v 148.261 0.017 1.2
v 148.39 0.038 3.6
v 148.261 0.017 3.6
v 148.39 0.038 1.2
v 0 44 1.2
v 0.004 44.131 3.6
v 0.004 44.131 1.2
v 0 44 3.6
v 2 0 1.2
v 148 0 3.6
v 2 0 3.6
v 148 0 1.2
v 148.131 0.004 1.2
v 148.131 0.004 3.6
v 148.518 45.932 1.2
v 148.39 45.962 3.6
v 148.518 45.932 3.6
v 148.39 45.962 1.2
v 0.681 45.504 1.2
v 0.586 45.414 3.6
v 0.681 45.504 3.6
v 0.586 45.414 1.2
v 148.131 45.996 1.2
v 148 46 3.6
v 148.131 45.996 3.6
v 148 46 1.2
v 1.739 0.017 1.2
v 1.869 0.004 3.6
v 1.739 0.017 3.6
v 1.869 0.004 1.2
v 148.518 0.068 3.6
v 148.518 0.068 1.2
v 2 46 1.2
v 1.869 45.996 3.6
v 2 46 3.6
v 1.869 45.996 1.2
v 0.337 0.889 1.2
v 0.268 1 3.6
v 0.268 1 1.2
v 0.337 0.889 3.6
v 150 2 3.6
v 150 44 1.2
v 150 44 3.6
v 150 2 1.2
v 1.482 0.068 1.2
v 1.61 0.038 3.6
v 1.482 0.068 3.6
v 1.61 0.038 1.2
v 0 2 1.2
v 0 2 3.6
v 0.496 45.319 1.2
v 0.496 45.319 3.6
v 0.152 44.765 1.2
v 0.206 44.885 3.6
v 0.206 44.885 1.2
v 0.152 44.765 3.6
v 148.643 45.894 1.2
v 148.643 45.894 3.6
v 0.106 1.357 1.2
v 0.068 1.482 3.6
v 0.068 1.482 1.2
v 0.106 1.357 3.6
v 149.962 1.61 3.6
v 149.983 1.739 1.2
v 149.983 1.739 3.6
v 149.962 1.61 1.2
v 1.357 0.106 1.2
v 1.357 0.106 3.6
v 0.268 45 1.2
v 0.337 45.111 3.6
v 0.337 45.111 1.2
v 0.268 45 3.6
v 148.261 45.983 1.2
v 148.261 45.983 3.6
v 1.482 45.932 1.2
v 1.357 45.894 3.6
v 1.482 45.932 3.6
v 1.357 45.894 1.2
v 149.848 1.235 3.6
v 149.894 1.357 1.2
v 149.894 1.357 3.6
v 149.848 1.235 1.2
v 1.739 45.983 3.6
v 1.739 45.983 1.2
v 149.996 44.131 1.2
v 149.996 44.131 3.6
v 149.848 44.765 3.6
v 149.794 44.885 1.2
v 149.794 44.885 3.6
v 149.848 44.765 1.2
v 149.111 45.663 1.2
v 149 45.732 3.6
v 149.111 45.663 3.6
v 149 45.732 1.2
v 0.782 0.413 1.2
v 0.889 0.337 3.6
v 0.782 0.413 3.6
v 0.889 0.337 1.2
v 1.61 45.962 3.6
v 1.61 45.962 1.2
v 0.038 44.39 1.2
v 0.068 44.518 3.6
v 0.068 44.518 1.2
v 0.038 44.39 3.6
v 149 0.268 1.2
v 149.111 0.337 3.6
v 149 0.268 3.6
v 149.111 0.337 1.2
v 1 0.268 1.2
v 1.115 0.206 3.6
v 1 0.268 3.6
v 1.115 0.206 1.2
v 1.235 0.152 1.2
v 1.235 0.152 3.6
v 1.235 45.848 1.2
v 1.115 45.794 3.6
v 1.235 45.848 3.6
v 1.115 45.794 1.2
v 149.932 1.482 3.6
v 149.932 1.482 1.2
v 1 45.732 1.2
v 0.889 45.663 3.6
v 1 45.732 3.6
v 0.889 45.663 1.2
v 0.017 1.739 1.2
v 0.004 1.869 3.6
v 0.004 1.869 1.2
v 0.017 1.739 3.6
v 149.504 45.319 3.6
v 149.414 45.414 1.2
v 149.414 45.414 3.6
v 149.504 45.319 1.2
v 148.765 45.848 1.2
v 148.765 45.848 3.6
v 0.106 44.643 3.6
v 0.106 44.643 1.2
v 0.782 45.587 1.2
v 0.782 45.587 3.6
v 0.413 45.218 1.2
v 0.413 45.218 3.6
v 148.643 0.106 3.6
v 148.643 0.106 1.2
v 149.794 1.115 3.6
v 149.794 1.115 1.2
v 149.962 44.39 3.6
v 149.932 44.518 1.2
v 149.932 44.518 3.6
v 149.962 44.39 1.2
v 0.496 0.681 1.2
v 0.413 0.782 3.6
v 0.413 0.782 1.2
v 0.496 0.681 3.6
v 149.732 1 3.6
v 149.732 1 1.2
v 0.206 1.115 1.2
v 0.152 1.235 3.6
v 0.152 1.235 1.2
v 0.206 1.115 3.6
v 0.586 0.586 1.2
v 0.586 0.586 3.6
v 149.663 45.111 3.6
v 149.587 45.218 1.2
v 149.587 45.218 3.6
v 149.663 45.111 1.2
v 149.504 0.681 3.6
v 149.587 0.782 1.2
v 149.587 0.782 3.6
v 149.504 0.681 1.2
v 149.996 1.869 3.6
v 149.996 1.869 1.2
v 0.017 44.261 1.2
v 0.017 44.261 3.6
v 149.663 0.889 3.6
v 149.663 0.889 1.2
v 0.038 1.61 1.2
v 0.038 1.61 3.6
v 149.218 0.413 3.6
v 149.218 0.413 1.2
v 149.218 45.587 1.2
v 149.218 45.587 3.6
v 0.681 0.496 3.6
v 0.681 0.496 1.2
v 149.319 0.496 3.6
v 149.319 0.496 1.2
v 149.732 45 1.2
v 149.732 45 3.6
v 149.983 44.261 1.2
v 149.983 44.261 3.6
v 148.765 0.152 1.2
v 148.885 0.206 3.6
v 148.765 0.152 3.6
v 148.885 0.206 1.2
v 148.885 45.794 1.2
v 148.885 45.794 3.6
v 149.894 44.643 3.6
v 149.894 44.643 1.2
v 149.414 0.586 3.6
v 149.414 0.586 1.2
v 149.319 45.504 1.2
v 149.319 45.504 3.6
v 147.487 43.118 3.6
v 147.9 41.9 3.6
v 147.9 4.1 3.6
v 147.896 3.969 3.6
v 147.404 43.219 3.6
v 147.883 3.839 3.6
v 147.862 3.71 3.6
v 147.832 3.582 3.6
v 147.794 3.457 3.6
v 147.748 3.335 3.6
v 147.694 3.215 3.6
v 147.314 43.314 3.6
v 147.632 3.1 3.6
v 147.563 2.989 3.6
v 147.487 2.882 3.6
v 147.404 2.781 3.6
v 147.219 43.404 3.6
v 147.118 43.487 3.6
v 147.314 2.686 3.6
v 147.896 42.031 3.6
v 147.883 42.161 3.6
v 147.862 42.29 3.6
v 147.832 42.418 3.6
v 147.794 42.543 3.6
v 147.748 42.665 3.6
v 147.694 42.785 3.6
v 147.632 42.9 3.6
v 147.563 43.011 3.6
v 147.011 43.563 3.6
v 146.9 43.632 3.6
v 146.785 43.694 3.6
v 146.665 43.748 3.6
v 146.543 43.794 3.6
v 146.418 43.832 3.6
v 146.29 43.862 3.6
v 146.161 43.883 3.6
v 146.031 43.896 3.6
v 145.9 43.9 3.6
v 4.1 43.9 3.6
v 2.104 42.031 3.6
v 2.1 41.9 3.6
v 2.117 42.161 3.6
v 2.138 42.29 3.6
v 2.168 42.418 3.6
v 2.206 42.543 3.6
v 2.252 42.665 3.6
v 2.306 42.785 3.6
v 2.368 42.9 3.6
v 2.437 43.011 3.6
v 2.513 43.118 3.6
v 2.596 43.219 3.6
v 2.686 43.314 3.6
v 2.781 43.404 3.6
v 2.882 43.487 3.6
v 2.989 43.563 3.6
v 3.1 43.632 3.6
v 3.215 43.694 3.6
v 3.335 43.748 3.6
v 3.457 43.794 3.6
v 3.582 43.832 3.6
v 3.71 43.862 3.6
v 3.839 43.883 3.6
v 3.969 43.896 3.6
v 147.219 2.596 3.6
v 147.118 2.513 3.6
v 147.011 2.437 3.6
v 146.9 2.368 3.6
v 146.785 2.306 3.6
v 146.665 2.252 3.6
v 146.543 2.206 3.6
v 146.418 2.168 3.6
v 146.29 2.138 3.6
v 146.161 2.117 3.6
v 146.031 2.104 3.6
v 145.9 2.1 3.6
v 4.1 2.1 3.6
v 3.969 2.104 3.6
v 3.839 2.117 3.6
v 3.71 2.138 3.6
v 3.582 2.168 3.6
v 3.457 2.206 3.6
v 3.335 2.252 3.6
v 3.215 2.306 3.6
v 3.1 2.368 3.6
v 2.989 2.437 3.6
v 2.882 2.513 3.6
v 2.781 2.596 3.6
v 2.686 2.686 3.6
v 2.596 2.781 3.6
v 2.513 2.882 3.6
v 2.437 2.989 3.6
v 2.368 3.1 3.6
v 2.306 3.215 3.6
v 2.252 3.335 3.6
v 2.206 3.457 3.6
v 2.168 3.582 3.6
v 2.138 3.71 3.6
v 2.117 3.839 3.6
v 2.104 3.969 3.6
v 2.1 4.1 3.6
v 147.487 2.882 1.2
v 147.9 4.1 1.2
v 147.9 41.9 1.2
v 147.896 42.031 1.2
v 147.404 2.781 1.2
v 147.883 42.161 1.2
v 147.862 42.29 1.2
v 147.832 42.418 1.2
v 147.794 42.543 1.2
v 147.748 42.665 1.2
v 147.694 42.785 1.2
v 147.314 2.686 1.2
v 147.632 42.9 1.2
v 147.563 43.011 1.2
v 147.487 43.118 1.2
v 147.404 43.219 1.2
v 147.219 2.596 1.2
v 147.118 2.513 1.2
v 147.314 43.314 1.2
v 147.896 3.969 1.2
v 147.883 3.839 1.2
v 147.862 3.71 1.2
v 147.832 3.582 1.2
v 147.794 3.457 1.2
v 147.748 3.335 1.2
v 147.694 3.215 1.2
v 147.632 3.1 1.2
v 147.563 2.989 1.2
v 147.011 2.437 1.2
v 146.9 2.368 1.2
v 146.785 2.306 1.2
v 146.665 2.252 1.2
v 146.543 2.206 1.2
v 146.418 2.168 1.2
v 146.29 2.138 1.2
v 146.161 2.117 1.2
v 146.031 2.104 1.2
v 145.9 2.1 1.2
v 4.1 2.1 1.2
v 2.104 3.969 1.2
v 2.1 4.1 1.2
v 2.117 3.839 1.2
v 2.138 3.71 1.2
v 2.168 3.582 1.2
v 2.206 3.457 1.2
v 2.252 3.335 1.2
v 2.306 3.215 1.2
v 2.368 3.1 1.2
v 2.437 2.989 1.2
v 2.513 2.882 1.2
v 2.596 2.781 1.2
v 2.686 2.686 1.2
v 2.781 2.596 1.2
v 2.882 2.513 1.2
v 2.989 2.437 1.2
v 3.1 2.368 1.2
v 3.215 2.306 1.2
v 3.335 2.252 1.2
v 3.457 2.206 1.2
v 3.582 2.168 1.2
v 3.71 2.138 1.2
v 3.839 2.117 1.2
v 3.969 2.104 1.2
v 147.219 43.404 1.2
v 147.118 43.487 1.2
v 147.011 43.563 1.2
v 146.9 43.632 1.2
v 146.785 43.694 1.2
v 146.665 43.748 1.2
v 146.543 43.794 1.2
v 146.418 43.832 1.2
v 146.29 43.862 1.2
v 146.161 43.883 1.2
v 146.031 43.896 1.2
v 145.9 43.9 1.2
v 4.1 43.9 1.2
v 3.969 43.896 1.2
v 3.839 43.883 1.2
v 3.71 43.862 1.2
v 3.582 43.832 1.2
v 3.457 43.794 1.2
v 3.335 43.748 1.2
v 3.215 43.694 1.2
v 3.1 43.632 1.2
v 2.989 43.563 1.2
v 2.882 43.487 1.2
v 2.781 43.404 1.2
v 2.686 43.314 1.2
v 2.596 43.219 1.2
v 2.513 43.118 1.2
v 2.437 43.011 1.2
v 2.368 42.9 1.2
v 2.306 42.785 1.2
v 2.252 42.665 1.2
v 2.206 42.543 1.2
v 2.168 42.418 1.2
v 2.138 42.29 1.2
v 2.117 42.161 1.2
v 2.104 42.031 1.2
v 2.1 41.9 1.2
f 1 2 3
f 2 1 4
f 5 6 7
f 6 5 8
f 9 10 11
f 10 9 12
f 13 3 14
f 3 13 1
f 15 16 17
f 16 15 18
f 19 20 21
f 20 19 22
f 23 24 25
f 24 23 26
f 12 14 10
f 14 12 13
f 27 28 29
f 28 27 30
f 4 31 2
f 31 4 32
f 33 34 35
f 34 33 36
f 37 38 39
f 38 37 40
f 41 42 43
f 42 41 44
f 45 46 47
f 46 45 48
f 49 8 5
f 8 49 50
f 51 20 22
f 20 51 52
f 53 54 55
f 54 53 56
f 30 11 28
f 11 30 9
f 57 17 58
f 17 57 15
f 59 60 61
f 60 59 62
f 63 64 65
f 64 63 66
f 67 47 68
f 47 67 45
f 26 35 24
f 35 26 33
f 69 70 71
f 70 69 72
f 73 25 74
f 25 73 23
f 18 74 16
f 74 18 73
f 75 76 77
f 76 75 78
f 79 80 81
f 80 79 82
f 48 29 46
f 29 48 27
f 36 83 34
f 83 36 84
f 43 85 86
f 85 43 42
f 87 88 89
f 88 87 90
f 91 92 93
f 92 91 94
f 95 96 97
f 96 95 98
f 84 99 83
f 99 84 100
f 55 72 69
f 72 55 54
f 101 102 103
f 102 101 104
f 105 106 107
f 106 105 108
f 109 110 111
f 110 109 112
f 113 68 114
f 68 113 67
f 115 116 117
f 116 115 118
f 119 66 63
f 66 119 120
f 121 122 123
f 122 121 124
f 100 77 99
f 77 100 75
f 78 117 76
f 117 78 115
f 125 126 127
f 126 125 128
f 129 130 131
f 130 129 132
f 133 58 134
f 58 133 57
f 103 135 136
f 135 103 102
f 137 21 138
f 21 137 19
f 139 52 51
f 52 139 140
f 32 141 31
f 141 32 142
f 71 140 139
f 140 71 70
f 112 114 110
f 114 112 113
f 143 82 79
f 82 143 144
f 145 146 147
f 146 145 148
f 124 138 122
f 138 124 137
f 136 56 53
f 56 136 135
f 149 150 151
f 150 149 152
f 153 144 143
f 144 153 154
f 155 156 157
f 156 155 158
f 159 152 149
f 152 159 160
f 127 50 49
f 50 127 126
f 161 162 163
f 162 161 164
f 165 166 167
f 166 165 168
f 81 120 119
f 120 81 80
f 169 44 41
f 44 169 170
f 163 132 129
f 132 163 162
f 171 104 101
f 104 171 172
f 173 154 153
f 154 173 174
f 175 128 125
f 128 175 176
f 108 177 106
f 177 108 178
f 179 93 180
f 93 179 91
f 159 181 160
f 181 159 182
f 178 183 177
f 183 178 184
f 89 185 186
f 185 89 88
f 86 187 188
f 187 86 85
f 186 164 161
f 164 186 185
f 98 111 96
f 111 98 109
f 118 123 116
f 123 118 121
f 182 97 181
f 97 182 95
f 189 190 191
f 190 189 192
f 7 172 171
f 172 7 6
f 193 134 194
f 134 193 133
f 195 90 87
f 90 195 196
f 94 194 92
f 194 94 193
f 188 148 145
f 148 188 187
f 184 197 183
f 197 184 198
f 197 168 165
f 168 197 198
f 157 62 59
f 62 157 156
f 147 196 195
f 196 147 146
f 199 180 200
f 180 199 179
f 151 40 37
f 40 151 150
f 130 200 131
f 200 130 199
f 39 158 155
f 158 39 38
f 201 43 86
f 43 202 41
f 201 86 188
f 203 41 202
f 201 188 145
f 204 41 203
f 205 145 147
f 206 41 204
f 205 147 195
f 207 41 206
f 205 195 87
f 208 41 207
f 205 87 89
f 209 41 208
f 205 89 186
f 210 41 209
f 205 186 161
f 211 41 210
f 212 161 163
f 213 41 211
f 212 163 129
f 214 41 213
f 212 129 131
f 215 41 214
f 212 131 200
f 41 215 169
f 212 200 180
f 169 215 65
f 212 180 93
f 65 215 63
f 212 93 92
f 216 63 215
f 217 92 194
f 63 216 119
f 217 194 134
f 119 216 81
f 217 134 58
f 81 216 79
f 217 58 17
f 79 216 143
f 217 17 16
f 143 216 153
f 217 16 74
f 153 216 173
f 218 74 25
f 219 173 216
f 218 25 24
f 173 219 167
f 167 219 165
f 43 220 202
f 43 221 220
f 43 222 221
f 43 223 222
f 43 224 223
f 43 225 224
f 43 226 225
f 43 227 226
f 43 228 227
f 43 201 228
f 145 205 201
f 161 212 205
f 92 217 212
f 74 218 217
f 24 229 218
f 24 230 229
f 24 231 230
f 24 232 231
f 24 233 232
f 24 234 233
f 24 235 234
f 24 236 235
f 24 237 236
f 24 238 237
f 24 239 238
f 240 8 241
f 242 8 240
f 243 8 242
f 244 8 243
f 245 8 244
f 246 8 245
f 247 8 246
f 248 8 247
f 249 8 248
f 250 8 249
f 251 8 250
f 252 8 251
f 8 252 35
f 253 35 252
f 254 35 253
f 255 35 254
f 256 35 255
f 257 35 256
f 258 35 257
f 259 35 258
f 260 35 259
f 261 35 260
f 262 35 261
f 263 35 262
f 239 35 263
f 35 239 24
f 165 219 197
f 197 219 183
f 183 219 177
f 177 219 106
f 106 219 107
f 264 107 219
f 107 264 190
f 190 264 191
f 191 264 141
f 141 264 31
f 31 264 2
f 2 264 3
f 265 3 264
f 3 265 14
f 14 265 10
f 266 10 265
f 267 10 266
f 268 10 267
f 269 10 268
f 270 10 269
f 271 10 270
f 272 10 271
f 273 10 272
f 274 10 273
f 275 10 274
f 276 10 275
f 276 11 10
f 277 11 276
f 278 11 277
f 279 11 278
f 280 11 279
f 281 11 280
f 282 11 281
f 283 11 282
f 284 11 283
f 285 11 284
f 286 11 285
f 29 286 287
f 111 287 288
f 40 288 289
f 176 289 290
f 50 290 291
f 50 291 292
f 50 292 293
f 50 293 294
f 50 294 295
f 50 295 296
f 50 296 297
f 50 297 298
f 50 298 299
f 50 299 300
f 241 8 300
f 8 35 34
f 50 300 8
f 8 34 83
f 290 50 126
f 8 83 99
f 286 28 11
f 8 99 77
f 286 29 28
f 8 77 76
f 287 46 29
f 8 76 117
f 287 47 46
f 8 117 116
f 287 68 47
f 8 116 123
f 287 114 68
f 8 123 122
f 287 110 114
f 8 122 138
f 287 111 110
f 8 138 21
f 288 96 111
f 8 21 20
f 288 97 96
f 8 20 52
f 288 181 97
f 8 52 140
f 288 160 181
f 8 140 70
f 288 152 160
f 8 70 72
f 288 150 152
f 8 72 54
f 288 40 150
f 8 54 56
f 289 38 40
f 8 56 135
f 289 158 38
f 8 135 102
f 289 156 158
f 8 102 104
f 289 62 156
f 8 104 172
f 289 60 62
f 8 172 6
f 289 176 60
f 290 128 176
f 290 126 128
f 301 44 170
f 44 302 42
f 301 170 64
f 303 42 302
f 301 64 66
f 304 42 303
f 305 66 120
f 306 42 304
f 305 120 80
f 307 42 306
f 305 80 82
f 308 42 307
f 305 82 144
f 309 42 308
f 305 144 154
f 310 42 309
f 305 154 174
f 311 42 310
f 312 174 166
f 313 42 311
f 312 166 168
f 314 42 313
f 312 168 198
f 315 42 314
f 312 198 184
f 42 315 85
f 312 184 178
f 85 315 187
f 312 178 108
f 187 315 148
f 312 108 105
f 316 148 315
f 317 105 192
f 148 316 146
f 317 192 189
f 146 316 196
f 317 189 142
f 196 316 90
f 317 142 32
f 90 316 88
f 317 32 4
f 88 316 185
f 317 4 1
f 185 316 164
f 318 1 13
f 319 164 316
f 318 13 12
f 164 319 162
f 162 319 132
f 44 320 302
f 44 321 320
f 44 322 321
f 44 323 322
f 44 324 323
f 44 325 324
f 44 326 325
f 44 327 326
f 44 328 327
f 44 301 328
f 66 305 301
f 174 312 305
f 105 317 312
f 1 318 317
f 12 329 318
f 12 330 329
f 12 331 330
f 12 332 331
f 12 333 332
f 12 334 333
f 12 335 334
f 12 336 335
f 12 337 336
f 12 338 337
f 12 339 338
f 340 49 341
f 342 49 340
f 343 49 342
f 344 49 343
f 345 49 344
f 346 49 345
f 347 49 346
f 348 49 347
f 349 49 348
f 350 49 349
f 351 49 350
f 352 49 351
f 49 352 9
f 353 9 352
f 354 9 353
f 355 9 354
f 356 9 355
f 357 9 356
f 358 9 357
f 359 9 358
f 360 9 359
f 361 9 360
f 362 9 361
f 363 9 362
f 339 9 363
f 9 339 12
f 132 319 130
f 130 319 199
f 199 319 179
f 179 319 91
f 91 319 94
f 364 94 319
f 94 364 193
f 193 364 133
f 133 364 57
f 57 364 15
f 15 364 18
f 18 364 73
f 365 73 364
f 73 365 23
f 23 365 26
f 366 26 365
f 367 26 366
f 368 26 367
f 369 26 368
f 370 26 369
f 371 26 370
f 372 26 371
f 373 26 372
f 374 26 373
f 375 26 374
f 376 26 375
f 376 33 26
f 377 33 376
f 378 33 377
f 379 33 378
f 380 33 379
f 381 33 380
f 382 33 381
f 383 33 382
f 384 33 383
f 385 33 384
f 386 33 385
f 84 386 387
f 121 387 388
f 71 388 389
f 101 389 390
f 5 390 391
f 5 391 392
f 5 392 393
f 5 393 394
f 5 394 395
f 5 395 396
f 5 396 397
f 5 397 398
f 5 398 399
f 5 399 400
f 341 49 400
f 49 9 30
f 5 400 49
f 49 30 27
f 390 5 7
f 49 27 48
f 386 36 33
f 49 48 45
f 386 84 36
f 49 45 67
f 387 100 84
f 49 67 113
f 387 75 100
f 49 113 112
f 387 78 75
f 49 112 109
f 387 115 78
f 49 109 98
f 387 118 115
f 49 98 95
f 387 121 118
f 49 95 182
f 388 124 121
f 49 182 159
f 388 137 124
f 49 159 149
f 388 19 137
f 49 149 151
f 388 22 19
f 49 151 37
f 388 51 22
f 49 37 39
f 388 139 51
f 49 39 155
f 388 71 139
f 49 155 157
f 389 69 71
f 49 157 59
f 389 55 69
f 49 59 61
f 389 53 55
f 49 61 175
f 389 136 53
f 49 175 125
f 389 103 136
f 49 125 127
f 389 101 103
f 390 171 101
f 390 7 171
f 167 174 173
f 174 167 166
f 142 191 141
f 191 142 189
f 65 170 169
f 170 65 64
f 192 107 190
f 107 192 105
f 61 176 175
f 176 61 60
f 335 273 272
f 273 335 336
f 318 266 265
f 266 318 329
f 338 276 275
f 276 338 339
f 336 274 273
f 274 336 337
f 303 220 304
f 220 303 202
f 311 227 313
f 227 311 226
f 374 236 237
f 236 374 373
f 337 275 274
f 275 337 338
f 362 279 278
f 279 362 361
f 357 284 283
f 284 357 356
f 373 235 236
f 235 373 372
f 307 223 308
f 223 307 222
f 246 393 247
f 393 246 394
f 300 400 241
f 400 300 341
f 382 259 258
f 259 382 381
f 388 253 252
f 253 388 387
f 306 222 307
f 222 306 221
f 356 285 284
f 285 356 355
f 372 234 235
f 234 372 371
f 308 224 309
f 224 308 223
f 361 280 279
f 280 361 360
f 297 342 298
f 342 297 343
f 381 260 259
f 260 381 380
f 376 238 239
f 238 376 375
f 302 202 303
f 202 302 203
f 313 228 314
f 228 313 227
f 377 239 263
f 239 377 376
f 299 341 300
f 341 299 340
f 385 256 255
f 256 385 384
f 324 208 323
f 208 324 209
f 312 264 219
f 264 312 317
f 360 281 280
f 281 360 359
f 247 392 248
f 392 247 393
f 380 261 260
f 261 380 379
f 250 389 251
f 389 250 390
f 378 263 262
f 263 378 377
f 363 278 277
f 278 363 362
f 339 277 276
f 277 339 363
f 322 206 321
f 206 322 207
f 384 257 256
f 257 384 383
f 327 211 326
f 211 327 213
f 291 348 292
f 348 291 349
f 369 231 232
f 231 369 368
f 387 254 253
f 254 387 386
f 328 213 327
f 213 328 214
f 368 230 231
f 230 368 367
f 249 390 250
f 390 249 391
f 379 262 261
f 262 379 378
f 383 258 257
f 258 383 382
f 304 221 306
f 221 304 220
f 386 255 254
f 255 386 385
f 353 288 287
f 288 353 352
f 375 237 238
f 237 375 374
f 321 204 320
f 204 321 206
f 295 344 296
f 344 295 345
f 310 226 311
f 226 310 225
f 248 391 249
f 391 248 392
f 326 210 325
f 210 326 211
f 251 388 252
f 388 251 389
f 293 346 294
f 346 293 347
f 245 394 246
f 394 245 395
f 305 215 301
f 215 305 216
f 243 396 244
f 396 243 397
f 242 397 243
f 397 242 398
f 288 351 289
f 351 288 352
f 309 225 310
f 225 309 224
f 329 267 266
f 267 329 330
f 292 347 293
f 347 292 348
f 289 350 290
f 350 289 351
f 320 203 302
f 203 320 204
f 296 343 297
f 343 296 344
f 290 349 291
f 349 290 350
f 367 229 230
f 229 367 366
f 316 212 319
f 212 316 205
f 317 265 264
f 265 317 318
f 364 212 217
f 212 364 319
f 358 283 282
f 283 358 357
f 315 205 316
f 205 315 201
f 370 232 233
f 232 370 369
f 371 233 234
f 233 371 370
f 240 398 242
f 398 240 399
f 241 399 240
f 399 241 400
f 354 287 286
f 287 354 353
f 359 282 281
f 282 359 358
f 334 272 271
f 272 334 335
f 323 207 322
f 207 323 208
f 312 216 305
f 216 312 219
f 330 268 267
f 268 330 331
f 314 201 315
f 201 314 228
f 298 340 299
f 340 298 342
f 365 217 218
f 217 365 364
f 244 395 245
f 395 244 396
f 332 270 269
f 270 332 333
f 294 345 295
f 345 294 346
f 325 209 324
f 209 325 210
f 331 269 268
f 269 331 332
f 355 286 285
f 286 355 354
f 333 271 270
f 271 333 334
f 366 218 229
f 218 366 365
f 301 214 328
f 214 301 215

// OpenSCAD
/*
 * Wall Clock Case for LED Matrix Display
 *
 * A 3D printable case designed for a 4x MAX7219 LED matrix display
 * with integrated GPS module mounting and ventilation system.
 *
 * Features:
 * - Customizable dimensions for different LED matrix sizes
 * - Integrated ventilation system for heat dissipation (optional cross-flow)
 * - GPS module mounting (Neo-6M compatible)
 * - M3 screw mounting system
 * - Rounded corners
 * - Modular design for easy customization
 *
 * Author: zeevy
 * License: MIT
 * Version: 1.1
 *
 * Dependencies:
 * - OpenSCAD 2019.05 or later
 *
 * Usage:
 * - Toggle the render flags in the Assembly section to choose what to export.
 * - Adjust parameters in the Configuration section as needed.
 * - Use $preview = true for fast preview, false for final render.
 */

// ============================================================================
// CONFIGURATION PARAMETERS
// ============================================================================

// Rendering quality
$fn = $preview ? 30 : 96;

// Render epsilon. Keeps boolean cuts from leaving zero-thickness faces.
// Tuned separately from physical assembly clearance (see back_panel_fit_tolerance).
eps = 0.05;

// Material and manufacturing parameters
wall_thickness        = 3.5;    // Thickness of case walls
screen_thickness      = 0.64;   // Thickness of screen/display area

// LED Matrix Display dimensions (MAX7219 4x configuration)
led_matrix_length     = 128 + 1;  // Length of LED matrix + clearance
led_matrix_width      = 32 + 1;   // Width of LED matrix + clearance
led_matrix_height     = 15;       // Height of LED matrix

// Main case dimensions
case_length           = 150;    // Total length of the case
case_width            = 46;     // Total width of the case
case_height           = 32;     // Total height of the case
case_bottom_thickness = 5;      // Thickness of bottom panel that holds the LED matrix
case_corner_radius    = 2;      // Corner radius for case and panel geometry

// Back panel fit. Total radial clearance between panel and its recess in the case.
back_panel_fit_tolerance = 0.3;

// Ventilation
ventilation_hole_diameter   = 1.26;
ventilation_slot_length     = 16;
ventilation_hole_spacing    = 3.8;
ventilation_hole_count      = 8;
ventilation_enable_back_wall = true;  // Mirror vents to opposite long wall for cross-flow

// GPS antenna (Neo-6M is square ~25mm)
gps_antenna_size            = 25.25;
gps_module_cutout_inset_x   = 40;   // Distance from case end (back panel antenna cutout)
gps_module_bracket_inset_x  = 42;   // Distance from case end (back panel bracket)
gps_post_origin_x           = 96;   // X offset for Neo-6M PCB mounting posts (back panel frame)
gps_post_spacing_x          = 31;   // PCB hole spacing in X (Neo-6M board)
gps_post_spacing_y          = 20.6; // PCB hole spacing in Y (Neo-6M board)

// Hardware
m3_screw_tap_hole_diameter         = 2.8;   // Self-tap hole in mounting feet
m3_screw_shaft_clearance_diameter  = 3.25;  // Through-hole in back panel
m3_screw_distance_from_edge        = 5.5;   // Distance from case edge to mounting feet/holes
m3_screw_head_recess_diameter      = 6;     // Counterbore diameter for screw head
// Counterbore depth into the back panel. With 2.0mm depth in a 3.5mm panel, a
// standard 3mm cap head will sit ~1mm proud. Increase toward ~3.0mm if you use
// flat/countersunk M3 screws (panel still needs material below the recess).
m3_screw_head_recess_depth         = 2;

// Cable management
cable_pass_through_diameter        = 4.5;
cable_pass_through_inset_x         = 12;  // Distance from each end of the back panel
cable_pass_through_y               = 4.6;

// Mounting bars on the underside of the case
foot_bar_inset_x                   = 15;

// Display ring
display_ring_thickness             = 2.4;  // Z thickness of the ring
display_ring_border                = 4.2;  // XY width of the ring border

// Assembly render toggles
render_case        = false;
render_back_panel  = false;
render_display_ring = true;

// ============================================================================
// SANITY ASSERTIONS
// ============================================================================

assert(case_length > led_matrix_length + 2 * wall_thickness,
       "case_length must accommodate led_matrix_length plus side walls");
assert(case_width > led_matrix_width + 2 * wall_thickness,
       "case_width must accommodate led_matrix_width plus side walls");
assert(case_height > led_matrix_height + case_bottom_thickness + wall_thickness,
       "case_height must accommodate led_matrix_height plus floor and back panel");
assert(m3_screw_head_recess_depth < wall_thickness,
       "m3_screw_head_recess_depth must leave material below; reduce depth or thicken wall");

// ============================================================================
// MAIN ASSEMBLY
// ============================================================================

color("lightgray") {
  if (render_case) {
    led_case();
  }

  if (render_back_panel) {
    translate([
      wall_thickness/2,
      wall_thickness/2,
      case_height - wall_thickness + display_ring_thickness/2
    ]) led_case_back_panel(include_holes = true, gap = 0);
  }

  if (render_display_ring) {
    translate([0, 0, display_ring_thickness/2]) display_ring();
  }
}

// ============================================================================
// CORE MODULES
// ============================================================================

/**
 * Main LED case. Primary housing for the LED matrix display with integrated
 * ventilation, mounting points, and cable management.
 */
module led_case() {
  union() {
    difference() {
      // Outer case shell
      rounded_box(case_length, case_width, case_height, case_corner_radius);

      // Interior cavity
      translate([wall_thickness, wall_thickness, case_bottom_thickness]) {
        cube([case_length - wall_thickness * 2,
              case_width - wall_thickness * 2,
              case_height + wall_thickness]);
      }

      // LED matrix cutout
      translate([(case_length - led_matrix_length)/2,
                 (case_width - led_matrix_width)/2,
                 screen_thickness]) {
        led_matrix_cutout();
      }

      // Back panel mounting recess. Subtract ONLY the plate shape so the GPS
      // bracket and mounting posts (added by led_case_back_panel) do not also
      // carve features into the case body.
      translate([wall_thickness/2,
                 wall_thickness/2,
                 case_height - wall_thickness + eps]) {
        back_panel_plate(include_holes = false, gap = back_panel_fit_tolerance);
      }

      // Ventilation on the y=0 long wall
      create_ventilation_slots(start_x = 20);
      create_ventilation_slots(
        start_x = case_length - (20 + ventilation_hole_spacing * ventilation_hole_count + ventilation_hole_diameter * 2)
      );

      // Optional mirrored vents on the y=case_width wall for cross-flow
      if (ventilation_enable_back_wall) {
        translate([0, case_width, 0]) mirror([0, 1, 0]) {
          create_ventilation_slots(start_x = 20);
          create_ventilation_slots(
            start_x = case_length - (20 + ventilation_hole_spacing * ventilation_hole_count + ventilation_hole_diameter * 2)
          );
        }
      }
    }

    create_mounting_feet();
    create_bottom_feet();
  }
}

/**
 * Back panel assembly: plate plus GPS bracket plus GPS PCB mounting posts.
 * @param include_holes Whether to include screw, GPS, and cable cutouts.
 * @param gap Additional clearance applied to the plate footprint.
 */
module led_case_back_panel(include_holes = true, gap = 0) {
  union() {
    back_panel_plate(include_holes, gap);
    create_gps_mounting_bracket();
    translate([gps_post_origin_x, case_width/4, eps * 2]) {
      rotate([0, 180, 0]) neo_6m_mounting_posts();
    }
  }
}

/**
 * Back panel plate only (rounded box plus optional cutouts). Used standalone
 * for the printed plate and as the recess shape carved into the case body.
 */
module back_panel_plate(include_holes = true, gap = 0) {
  difference() {
    rounded_box(
      case_length - wall_thickness + gap,
      case_width  - wall_thickness + gap,
      wall_thickness,
      case_corner_radius
    );
    if (include_holes) {
      create_m3_mounting_holes();
      create_gps_module_cutout();
      create_cable_pass_throughs();
    }
  }
}

/**
 * Decorative ring around the display area.
 */
module display_ring() {
  difference() {
    rounded_box(case_length, case_width, display_ring_thickness, case_corner_radius);
    translate([display_ring_border/2, display_ring_border/2, -eps]) {
      rounded_box(
        case_length - display_ring_border,
        case_width  - display_ring_border,
        display_ring_thickness + eps * 2,
        2
      );
    }
  }
}

// ============================================================================
// COMPONENT MODULES
// ============================================================================

module led_matrix_cutout() {
  cube([led_matrix_length, led_matrix_width, led_matrix_height]);
}

/**
 * Row of capsule-shaped ventilation slots cutting through the y=0 long wall.
 * @param start_x X position where the row begins.
 */
module create_ventilation_slots(start_x) {
  for (i = [1 : ventilation_hole_count]) {
    translate([start_x, 0, (case_height/2 - ventilation_slot_length/2)]) {
      create_ventilation_slot(i);
    }
  }
}

module create_ventilation_slot(index) {
  hull() {
    translate([(ventilation_hole_spacing * index), 0, 0]) {
      rotate([-90, 0, 0])
        cylinder(d = ventilation_hole_diameter, h = wall_thickness + eps * 2);
    }
    translate([(ventilation_hole_spacing * index), 0, ventilation_slot_length]) {
      rotate([-90, 0, 0])
        cylinder(d = ventilation_hole_diameter, h = wall_thickness + eps * 2);
    }
  }
}

/**
 * Two mounting posts inside the case (back panel screws thread into these).
 */
module create_mounting_feet() {
  foot_height = case_height - case_bottom_thickness - wall_thickness + (eps * 2);

  translate([m3_screw_distance_from_edge, case_width/2, case_bottom_thickness - eps]) {
    mounting_foot(7.5, m3_screw_tap_hole_diameter, foot_height);
  }

  translate([case_length - m3_screw_distance_from_edge, case_width/2, case_bottom_thickness - eps]) {
    mounting_foot(7.5, m3_screw_tap_hole_diameter, foot_height);
  }
}

/**
 * Cable-management bars on the underside of the case.
 */
module create_bottom_feet() {
  footbar_width  = 2.5;
  footbar_height = 1.5;

  // Left bar
  hull() {
    translate([foot_bar_inset_x, -(footbar_height - eps), footbar_width]) {
      cube([footbar_width, footbar_height, (case_height - footbar_width * 2)]);
    }
    translate([foot_bar_inset_x, 0, 0]) {
      cube([footbar_width, eps, eps]);
    }
  }

  // Right bar
  hull() {
    translate([case_length - foot_bar_inset_x, -(footbar_height - eps), footbar_width]) {
      cube([footbar_width, footbar_height, (case_height - footbar_width * 2)]);
    }
    translate([case_length - foot_bar_inset_x, 0, 0]) {
      cube([footbar_width, eps, eps]);
    }
  }
}

/**
 * Shaft clearance hole plus counterbore for the M3 screw head, both ends.
 */
module create_m3_mounting_holes() {
  y_pos = (case_width - wall_thickness) / 2;
  x_positions = [
    m3_screw_distance_from_edge - wall_thickness/2,
    case_length - wall_thickness/2 - m3_screw_distance_from_edge
  ];

  for (x_pos = x_positions) {
    translate([x_pos, y_pos, -eps]) {
      cylinder(d = m3_screw_shaft_clearance_diameter,
               h = wall_thickness + (eps * 2));
    }
    translate([x_pos, y_pos, wall_thickness - m3_screw_head_recess_depth]) {
      cylinder(d = m3_screw_head_recess_diameter,
               h = m3_screw_head_recess_depth + eps * 2);
    }
  }
}

module create_gps_module_cutout() {
  translate([case_length - gps_module_cutout_inset_x,
             (case_width - gps_antenna_size - wall_thickness) / 2,
             -wall_thickness/2]) {
    rounded_box(gps_antenna_size, gps_antenna_size, wall_thickness + (eps * 2), 1.8);
  }
}

module create_cable_pass_throughs() {
  translate([(case_length - wall_thickness + eps) - cable_pass_through_inset_x,
             cable_pass_through_y,
             -eps])
    cylinder(d = cable_pass_through_diameter, h = wall_thickness + eps);
  translate([cable_pass_through_inset_x, cable_pass_through_y, -eps])
    cylinder(d = cable_pass_through_diameter, h = wall_thickness + eps);
}

module create_gps_mounting_bracket() {
  translate([case_length - gps_module_bracket_inset_x,
             (case_width - gps_antenna_size - wall_thickness - 4) / 2,
             -wall_thickness + eps]) {
    difference() {
      rounded_box(gps_antenna_size + 4, gps_antenna_size + 4, 5 + (eps * 2), 1.8);
      translate([2, 2, -eps])
        rounded_box(gps_antenna_size, gps_antenna_size, 5 + (eps * 4), 1.8);
    }
  }
}

/**
 * Neo-6M GPS PCB mounting posts. Hole spacing is gps_post_spacing_x by
 * gps_post_spacing_y (configurable above).
 */
module neo_6m_mounting_posts() {
  for (x = [0, gps_post_spacing_x], y = [0, gps_post_spacing_y]) {
    translate([x, y, 0]) mounting_foot(8, m3_screw_tap_hole_diameter, 3.5);
  }
}

// ============================================================================
// UTILITY MODULES
// ============================================================================

/**
 * Rounded rectangular box. Final extents are [0..length] x [0..width] x [0..height].
 */
module rounded_box(length, width, height, radius) {
  translate([radius, radius, 0]) {
    linear_extrude(height = height) {
      offset(r = radius) {
        square([length - radius * 2, width - radius * 2]);
      }
    }
  }
}

/**
 * Cylindrical mounting post with a flared base for strength.
 * @param diameter      Post diameter.
 * @param hole_diameter Tap-hole diameter through the post.
 * @param height        Total post height.
 * @param fillet_radius Radius of the base flare (default 1.5).
 */
module mounting_foot(diameter, hole_diameter, height, fillet_radius = 1.5) {
  difference() {
    difference() {
      cylinder(d = diameter + fillet_radius, h = height);
      rotate_extrude() {
        translate([(diameter + fillet_radius * 2) / 2, fillet_radius, 0]) {
          minkowski() {
            square(height);
            circle(fillet_radius);
          }
        }
      }
    }
    cylinder(d = hole_diameter, h = height + 1);
  }
}
